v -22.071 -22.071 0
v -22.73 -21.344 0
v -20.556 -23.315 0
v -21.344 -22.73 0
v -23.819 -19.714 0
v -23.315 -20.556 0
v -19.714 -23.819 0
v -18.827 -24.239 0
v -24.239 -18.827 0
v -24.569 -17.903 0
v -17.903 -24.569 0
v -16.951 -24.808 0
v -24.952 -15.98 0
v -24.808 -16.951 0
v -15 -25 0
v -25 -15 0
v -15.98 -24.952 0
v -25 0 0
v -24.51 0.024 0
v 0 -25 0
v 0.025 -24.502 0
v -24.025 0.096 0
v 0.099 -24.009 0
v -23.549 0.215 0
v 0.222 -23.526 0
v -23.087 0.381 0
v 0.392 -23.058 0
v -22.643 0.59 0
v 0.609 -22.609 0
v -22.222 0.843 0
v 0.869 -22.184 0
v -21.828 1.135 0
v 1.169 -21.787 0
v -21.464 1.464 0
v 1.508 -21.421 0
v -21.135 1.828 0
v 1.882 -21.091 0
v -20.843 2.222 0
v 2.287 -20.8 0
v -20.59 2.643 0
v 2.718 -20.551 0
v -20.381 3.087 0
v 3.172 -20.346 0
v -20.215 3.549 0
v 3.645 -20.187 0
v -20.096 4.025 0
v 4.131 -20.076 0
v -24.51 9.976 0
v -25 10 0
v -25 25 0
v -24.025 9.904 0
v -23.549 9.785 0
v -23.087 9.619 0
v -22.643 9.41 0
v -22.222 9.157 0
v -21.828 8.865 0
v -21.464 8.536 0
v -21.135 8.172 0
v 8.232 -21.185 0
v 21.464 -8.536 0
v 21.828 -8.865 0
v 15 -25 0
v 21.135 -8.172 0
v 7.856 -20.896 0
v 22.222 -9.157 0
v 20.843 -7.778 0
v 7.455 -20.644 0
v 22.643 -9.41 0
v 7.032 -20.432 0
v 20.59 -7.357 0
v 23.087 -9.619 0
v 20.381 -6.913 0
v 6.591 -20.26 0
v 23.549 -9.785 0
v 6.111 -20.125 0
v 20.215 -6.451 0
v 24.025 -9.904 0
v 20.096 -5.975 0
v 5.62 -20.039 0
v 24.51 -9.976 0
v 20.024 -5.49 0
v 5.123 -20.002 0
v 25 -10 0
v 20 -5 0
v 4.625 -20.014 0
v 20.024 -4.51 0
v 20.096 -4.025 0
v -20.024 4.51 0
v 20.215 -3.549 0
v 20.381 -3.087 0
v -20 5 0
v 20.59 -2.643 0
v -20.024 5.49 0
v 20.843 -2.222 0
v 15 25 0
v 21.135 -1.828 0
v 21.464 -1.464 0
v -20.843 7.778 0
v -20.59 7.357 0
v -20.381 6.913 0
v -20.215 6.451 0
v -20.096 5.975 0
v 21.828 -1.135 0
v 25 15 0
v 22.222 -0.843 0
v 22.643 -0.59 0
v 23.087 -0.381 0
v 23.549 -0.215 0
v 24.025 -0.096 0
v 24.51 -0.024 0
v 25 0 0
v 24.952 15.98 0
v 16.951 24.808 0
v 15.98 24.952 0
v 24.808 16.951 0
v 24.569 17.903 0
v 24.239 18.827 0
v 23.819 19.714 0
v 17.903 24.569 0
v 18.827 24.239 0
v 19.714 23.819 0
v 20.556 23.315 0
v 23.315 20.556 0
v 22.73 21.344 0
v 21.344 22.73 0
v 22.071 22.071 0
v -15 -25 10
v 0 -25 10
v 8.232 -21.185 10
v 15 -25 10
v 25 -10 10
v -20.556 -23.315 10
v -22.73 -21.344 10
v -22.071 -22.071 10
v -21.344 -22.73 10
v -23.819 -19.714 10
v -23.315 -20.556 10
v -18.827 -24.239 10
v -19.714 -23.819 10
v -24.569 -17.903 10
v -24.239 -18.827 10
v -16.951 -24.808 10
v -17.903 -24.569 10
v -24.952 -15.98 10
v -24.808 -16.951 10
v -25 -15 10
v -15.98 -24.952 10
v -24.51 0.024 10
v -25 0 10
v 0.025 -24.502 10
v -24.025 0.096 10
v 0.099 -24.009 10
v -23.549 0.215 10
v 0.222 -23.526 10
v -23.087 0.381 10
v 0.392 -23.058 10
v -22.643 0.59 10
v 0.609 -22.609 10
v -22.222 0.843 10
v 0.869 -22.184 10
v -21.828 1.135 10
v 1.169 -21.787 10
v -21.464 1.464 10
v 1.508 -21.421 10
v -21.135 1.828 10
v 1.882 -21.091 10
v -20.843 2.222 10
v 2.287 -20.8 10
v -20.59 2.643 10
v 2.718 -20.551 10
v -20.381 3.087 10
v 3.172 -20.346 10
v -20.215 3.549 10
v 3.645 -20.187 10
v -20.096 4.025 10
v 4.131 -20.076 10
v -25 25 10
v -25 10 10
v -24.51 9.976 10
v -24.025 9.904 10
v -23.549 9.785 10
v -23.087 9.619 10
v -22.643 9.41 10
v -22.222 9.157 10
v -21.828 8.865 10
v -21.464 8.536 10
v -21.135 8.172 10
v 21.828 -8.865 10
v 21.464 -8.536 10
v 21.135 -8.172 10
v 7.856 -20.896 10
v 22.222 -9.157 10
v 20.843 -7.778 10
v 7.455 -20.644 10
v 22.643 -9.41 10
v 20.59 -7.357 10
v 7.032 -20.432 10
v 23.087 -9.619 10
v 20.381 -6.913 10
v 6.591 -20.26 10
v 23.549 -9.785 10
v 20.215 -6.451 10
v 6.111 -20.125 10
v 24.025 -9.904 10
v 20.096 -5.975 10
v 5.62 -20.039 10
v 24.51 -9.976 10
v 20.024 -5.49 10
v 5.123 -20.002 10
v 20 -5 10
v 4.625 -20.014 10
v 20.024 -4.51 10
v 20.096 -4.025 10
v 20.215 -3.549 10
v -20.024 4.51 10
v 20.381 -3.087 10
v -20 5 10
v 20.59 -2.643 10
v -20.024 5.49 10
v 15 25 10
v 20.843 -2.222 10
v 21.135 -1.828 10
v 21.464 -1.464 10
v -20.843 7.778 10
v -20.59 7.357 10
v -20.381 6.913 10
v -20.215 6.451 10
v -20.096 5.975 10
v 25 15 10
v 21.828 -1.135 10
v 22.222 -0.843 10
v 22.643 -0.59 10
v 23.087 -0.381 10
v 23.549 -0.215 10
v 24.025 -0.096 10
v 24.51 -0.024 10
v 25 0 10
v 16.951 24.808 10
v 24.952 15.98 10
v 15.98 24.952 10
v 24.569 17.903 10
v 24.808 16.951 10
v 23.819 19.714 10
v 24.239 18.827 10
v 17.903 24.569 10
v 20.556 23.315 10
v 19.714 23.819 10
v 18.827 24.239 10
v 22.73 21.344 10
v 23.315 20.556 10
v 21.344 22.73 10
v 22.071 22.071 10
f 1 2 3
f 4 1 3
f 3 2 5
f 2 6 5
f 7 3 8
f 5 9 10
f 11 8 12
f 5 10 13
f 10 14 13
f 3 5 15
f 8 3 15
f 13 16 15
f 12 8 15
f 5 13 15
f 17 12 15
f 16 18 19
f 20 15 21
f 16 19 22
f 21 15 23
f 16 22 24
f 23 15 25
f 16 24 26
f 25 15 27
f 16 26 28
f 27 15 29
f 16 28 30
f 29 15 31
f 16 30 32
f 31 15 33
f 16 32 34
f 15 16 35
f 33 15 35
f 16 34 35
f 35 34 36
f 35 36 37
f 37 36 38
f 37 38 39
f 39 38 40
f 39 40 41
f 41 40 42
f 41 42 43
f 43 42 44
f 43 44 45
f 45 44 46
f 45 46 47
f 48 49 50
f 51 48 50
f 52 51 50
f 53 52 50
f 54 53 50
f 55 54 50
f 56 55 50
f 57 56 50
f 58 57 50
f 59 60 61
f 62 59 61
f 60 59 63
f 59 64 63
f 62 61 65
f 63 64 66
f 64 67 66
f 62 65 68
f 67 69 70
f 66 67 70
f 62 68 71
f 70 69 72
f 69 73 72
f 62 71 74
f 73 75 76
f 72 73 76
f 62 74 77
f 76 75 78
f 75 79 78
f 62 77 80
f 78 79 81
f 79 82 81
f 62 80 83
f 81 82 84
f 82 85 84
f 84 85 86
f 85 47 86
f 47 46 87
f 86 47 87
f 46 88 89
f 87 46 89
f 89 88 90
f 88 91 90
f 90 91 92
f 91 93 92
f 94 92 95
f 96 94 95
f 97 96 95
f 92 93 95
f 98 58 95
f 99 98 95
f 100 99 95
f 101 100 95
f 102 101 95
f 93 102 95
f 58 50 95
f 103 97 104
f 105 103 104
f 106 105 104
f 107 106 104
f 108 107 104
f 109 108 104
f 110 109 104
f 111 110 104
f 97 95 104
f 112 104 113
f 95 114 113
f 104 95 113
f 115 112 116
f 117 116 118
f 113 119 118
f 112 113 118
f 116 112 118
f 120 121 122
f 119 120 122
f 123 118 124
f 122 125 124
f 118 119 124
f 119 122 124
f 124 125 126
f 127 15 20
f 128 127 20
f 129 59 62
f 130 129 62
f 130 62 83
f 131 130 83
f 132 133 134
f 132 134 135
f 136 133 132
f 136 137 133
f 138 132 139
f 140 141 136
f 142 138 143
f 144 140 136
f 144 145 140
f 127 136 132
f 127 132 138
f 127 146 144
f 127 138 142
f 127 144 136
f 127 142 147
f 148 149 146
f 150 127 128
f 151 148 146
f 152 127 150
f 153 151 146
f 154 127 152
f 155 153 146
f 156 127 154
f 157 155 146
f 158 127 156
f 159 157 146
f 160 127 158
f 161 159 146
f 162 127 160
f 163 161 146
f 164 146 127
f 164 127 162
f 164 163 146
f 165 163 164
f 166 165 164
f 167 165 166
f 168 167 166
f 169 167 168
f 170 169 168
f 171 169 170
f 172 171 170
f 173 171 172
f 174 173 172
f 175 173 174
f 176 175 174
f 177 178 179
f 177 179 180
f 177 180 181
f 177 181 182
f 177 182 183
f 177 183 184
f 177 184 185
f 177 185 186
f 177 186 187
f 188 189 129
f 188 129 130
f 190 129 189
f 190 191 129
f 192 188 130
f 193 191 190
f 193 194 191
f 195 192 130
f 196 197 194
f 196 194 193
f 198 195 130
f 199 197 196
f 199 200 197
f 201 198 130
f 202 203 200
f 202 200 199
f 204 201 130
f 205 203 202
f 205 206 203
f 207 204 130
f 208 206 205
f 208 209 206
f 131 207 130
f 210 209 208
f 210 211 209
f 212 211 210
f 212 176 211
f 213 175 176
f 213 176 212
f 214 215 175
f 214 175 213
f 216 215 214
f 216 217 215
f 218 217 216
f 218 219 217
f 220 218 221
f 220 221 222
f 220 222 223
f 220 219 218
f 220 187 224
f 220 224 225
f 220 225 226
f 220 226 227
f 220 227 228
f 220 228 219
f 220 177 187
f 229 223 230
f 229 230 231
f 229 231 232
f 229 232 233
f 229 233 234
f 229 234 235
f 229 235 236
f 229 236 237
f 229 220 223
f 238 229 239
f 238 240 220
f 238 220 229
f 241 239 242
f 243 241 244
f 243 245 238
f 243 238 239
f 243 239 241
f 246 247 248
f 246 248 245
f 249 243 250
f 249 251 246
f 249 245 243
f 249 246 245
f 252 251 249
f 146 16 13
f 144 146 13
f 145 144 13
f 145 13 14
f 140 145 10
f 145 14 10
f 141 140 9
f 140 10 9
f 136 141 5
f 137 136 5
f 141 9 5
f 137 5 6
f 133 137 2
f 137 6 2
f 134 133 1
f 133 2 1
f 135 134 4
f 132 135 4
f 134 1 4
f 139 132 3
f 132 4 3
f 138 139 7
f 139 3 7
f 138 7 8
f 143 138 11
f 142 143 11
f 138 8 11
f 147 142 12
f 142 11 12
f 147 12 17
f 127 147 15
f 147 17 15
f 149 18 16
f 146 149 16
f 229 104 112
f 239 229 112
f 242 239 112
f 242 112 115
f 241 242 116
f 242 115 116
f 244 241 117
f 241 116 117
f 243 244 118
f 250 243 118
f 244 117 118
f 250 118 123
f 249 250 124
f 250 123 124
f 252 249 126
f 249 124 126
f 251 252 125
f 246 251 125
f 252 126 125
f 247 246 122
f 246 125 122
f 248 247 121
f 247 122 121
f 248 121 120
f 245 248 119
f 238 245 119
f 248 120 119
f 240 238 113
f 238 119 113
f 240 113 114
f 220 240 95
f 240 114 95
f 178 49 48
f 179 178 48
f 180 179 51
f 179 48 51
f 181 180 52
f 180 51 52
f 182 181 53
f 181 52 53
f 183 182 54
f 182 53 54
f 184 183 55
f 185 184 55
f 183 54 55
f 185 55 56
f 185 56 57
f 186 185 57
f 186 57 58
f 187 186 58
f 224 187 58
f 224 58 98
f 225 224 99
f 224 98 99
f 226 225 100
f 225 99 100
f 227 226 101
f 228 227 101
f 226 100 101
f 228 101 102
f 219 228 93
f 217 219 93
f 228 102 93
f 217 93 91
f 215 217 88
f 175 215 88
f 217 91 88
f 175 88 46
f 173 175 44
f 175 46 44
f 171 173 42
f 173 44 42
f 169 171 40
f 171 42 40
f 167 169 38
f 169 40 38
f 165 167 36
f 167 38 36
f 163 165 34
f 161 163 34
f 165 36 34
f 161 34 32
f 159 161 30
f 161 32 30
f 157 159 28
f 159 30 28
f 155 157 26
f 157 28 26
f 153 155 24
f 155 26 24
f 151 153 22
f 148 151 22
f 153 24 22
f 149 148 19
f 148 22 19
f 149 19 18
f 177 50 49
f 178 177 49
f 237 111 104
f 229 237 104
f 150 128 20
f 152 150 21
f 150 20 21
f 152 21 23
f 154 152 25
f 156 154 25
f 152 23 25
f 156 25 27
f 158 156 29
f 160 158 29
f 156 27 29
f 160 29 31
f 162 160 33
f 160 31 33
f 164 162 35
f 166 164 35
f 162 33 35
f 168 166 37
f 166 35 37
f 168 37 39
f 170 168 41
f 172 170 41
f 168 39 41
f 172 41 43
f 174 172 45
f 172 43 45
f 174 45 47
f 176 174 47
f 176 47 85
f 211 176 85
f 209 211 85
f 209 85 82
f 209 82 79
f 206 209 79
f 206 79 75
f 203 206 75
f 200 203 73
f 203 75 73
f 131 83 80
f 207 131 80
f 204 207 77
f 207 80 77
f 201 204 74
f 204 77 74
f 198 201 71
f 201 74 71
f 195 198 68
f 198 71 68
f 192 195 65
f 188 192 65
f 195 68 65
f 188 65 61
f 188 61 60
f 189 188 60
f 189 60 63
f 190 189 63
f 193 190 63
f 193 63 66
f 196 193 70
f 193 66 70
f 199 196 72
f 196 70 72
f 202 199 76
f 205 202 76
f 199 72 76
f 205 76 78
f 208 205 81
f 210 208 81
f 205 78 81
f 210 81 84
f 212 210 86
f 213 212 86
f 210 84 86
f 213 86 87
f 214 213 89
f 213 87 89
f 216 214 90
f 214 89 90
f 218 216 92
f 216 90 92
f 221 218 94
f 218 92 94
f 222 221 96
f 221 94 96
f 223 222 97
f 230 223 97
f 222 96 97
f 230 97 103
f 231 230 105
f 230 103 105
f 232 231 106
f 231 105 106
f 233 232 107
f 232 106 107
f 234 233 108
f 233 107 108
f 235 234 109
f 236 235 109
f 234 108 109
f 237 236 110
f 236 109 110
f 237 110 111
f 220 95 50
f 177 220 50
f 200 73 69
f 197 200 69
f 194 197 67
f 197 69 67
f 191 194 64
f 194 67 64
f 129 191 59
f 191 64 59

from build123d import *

# Parameters (mm, degrees)
F1_DEPTH = 10


with BuildPart() as f1:
    # F0 (on Top) → F1 (new body)
    with BuildSketch(Plane.XY):
        with BuildLine():
            ThreePointArc((25, 15), (22.071068, 22.071068), (15, 25))
            Line((15, 25), (-25, 25))
            Line((-25, 25), (-25, 10))
            ThreePointArc((-25, 10), (-20, 5), (-25, 0))
            Line((-25, 0), (-25, -15))
            ThreePointArc((-25, -15), (-22.071068, -22.071068), (-15, -25))
            Line((-15, -25), (0, -25))
            ThreePointArc((0, -25), (2.080642, -20.94077), (6.590941, -20.259862))
            ThreePointArc((6.590941, -20.259862), (7.455256, -20.644347), (8.231687, -21.184741))
            Line((8.231687, -21.184741), (15, -25))
            Line((15, -25), (25, -10))
            ThreePointArc((25, -10), (20, -5), (25, 0))
            Line((25, 0), (25, 15))
        make_face()
    extrude(amount=F1_DEPTH)


solid = f1.part
